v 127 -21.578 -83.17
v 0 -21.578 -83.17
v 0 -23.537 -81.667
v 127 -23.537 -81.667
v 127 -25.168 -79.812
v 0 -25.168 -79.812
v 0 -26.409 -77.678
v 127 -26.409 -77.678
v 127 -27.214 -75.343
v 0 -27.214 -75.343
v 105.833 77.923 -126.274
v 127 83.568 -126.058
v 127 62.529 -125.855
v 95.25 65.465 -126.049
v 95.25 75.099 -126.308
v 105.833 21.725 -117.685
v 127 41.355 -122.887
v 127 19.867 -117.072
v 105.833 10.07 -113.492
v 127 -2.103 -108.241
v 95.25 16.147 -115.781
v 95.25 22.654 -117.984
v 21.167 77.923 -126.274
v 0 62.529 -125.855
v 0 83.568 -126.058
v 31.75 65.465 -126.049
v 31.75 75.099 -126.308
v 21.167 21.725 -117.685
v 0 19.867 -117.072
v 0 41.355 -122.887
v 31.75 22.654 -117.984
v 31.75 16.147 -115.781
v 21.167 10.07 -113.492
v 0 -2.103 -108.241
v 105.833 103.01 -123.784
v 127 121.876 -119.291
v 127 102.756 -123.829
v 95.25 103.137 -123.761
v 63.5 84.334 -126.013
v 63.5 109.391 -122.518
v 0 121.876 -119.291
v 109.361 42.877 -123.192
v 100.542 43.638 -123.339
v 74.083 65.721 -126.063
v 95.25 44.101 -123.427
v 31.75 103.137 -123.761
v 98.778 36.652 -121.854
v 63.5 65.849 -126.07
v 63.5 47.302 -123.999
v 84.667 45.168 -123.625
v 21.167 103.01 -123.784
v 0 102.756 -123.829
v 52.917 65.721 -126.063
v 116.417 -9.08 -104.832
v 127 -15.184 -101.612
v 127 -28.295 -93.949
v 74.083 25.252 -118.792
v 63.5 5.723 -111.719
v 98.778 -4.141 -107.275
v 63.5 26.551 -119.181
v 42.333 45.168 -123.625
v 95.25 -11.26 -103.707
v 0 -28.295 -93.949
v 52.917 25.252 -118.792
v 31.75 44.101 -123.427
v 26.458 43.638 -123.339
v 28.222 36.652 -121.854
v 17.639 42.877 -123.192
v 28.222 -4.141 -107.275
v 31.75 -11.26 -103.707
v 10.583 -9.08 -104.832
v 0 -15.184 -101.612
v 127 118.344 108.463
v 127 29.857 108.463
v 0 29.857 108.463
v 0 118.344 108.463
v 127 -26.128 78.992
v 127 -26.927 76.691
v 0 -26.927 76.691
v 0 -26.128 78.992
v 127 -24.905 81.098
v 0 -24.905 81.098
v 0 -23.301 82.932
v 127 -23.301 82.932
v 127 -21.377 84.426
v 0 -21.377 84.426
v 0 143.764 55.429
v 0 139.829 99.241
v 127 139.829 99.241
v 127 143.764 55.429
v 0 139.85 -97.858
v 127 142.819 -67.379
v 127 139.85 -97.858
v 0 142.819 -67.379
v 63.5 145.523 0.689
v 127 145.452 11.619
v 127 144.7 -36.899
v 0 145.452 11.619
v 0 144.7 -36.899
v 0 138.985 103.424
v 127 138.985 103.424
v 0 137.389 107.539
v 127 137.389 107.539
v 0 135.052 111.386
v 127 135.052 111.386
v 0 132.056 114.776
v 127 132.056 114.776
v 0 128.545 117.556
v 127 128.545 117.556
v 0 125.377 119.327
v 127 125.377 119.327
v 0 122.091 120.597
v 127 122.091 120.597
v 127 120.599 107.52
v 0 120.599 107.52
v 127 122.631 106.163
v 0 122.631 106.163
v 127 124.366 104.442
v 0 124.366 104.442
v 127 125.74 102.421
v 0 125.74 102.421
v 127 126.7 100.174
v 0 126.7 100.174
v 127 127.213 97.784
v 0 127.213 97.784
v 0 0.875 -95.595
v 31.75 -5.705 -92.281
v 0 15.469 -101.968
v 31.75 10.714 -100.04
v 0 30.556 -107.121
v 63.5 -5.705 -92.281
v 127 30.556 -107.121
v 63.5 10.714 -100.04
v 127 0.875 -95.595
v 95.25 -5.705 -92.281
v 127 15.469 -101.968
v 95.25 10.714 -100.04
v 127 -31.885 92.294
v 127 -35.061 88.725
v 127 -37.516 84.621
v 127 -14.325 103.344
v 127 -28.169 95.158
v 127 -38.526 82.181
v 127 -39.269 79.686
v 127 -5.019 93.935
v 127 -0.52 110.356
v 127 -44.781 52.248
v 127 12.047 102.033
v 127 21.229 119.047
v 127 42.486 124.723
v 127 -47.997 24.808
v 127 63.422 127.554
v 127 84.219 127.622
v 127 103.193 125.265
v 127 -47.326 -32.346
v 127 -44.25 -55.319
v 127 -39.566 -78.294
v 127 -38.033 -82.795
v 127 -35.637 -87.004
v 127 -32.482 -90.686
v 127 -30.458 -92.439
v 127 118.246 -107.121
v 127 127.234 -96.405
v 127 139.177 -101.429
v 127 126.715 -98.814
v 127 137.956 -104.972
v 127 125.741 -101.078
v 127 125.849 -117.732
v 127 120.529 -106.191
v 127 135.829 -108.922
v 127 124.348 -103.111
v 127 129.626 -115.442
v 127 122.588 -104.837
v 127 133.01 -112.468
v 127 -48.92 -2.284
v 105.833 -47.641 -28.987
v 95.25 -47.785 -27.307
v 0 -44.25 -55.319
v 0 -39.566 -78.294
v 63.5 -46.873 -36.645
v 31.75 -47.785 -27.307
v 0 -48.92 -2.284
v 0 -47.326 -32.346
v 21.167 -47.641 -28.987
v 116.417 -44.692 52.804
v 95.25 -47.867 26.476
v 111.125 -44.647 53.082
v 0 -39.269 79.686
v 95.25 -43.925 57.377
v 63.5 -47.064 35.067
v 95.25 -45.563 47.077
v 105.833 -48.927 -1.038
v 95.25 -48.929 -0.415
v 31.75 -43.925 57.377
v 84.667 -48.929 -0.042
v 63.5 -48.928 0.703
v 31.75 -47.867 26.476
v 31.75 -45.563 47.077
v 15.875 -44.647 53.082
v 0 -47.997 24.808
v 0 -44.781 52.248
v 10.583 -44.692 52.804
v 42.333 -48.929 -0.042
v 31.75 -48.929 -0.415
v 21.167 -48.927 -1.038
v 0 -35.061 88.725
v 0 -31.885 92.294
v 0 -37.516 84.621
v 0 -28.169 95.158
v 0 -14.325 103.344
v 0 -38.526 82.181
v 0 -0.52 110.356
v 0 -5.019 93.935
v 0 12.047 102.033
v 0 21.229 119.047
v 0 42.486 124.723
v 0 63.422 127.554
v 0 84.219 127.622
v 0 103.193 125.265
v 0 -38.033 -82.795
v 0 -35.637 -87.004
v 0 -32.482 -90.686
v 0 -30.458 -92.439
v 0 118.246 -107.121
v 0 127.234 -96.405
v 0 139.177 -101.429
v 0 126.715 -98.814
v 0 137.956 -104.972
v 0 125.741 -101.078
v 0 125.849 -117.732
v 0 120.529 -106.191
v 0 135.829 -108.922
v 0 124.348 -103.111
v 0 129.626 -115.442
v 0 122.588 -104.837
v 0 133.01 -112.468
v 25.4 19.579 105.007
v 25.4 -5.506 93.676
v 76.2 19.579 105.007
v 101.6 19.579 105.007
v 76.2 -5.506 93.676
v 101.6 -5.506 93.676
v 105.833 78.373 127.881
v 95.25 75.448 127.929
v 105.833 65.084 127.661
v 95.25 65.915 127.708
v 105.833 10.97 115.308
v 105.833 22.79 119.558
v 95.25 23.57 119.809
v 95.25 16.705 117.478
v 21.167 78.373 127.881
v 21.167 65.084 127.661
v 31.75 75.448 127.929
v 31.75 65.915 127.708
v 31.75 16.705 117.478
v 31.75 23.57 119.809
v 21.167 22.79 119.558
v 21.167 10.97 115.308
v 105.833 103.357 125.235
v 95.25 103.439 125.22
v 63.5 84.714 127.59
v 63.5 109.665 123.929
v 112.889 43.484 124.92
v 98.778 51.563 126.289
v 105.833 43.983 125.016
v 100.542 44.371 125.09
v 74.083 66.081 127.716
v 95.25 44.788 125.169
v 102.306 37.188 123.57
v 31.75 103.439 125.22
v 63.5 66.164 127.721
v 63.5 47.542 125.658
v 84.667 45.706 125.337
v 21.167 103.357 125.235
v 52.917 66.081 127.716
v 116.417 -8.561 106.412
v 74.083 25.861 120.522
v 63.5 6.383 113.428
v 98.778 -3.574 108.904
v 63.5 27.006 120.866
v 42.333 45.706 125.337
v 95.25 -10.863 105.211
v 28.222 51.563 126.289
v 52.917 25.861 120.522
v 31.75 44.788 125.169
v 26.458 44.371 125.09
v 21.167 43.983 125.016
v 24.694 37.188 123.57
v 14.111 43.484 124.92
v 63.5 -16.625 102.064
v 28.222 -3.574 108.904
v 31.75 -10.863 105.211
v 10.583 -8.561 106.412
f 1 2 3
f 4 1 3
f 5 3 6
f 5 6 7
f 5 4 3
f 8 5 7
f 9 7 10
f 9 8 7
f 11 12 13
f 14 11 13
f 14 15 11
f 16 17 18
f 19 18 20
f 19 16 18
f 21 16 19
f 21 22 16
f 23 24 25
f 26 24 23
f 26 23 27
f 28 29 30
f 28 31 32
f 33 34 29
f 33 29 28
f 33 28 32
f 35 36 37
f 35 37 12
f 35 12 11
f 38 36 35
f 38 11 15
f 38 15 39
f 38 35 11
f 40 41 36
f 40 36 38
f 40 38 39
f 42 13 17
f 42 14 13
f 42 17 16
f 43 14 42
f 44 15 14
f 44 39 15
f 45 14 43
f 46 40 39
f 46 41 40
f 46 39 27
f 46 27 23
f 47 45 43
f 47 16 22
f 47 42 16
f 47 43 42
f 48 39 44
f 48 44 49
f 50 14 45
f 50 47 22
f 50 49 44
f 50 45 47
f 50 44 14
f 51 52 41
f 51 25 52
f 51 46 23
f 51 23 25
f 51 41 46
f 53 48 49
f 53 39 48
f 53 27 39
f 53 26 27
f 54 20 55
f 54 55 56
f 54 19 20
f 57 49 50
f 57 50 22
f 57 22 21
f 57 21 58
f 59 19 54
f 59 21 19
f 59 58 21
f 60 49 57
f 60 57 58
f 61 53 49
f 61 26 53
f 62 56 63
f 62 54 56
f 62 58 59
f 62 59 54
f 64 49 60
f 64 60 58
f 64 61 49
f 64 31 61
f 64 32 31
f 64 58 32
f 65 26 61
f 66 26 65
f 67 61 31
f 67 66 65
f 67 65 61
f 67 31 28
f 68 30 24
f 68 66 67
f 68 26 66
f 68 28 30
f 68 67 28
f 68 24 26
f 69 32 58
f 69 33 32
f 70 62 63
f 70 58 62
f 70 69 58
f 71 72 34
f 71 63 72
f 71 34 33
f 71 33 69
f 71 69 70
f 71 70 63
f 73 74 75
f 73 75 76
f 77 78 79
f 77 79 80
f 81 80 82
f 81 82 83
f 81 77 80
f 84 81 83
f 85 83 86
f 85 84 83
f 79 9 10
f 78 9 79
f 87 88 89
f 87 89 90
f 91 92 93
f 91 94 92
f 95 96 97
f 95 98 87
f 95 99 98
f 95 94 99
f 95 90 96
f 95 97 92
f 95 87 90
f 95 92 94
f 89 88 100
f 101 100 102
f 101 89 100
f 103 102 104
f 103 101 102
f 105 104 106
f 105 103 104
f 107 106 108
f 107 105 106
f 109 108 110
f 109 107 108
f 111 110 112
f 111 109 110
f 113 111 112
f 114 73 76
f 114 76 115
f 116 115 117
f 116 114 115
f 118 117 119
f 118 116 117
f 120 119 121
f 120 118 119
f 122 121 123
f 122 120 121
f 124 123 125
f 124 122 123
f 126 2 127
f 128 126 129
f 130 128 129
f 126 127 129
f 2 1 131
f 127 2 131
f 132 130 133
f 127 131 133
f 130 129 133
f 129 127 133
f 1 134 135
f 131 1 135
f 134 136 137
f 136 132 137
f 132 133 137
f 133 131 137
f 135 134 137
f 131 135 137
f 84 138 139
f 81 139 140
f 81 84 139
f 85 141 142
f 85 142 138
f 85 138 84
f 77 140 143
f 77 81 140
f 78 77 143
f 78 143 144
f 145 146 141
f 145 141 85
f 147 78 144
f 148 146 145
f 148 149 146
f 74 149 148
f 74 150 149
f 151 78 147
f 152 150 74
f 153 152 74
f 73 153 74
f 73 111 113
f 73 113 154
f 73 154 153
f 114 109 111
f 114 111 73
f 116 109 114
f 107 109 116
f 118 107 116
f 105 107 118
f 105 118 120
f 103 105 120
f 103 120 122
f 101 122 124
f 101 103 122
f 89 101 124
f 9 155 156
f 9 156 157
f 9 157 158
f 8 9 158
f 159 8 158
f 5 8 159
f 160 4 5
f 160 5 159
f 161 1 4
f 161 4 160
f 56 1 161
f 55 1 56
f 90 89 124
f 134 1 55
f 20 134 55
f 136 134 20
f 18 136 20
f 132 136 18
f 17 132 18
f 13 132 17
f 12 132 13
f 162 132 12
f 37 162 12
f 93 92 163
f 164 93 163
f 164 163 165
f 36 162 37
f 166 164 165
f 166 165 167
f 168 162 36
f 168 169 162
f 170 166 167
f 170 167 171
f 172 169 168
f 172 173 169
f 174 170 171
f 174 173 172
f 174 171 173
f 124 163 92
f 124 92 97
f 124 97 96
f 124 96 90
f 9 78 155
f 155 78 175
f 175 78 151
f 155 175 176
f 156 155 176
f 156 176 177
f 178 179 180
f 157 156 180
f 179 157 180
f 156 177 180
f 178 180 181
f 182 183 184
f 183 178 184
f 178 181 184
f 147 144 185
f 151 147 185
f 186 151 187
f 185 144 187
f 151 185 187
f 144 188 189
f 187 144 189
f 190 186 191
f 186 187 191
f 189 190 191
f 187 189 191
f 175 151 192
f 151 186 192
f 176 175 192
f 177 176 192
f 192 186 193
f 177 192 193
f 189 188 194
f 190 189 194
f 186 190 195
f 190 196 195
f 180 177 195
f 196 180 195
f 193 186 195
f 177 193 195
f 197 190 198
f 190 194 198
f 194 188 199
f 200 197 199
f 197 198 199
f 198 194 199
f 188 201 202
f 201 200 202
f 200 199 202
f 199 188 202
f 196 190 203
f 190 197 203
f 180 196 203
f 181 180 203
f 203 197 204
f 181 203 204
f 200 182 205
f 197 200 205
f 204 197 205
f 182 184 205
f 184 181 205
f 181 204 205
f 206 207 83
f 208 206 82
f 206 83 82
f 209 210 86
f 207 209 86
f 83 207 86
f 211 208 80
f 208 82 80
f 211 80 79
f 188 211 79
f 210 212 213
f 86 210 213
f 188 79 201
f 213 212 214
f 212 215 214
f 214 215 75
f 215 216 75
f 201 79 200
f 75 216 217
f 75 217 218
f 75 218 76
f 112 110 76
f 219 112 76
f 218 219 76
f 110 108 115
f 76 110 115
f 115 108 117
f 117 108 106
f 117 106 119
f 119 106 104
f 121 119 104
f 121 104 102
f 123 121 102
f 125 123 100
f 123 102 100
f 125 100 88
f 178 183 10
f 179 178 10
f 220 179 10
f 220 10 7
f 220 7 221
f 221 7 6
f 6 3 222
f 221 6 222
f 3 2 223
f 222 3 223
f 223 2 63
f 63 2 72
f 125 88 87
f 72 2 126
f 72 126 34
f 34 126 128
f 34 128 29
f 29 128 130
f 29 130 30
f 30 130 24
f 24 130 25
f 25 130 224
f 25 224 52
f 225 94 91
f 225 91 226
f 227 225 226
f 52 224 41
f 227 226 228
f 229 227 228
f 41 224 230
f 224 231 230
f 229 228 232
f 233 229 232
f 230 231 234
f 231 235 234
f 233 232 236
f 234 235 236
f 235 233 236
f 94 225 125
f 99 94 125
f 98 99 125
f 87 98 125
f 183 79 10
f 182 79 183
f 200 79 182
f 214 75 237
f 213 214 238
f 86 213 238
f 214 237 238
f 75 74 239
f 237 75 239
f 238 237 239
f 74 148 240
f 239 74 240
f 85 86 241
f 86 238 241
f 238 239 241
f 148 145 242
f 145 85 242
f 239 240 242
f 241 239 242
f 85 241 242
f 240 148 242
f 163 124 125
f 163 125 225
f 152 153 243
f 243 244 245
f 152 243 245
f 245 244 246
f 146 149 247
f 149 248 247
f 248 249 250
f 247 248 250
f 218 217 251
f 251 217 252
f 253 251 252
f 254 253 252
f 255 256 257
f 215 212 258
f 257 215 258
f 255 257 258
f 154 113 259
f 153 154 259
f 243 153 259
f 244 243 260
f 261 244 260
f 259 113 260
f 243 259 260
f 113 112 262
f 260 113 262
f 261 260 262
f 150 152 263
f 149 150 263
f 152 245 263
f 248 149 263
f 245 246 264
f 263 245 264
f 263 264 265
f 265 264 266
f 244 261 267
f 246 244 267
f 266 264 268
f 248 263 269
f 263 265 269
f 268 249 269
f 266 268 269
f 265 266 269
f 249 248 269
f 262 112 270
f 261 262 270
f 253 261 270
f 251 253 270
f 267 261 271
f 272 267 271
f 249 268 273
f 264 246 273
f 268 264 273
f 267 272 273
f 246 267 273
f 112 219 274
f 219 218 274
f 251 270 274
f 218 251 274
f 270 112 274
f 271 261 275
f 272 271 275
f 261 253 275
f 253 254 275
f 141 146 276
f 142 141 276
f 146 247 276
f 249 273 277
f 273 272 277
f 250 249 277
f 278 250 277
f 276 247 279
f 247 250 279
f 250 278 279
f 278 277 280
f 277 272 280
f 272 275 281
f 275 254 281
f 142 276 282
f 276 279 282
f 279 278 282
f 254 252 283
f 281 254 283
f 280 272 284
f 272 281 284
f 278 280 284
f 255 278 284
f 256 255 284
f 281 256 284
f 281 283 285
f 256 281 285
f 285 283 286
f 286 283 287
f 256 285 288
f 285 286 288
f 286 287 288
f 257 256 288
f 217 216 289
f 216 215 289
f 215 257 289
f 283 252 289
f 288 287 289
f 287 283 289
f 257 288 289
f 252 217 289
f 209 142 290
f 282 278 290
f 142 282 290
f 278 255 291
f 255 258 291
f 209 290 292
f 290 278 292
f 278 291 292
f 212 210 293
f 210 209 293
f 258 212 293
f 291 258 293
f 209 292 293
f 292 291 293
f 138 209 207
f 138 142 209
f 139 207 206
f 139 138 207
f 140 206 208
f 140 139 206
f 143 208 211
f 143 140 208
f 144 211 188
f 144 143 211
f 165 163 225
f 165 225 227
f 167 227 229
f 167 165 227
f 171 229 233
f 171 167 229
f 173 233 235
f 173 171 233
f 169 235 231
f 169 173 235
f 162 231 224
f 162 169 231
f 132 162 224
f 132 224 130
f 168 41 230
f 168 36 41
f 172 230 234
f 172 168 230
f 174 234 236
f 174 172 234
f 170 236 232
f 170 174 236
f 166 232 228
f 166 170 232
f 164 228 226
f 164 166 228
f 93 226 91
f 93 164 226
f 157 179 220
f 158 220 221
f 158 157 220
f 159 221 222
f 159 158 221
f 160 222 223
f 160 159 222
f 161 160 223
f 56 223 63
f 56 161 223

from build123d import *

# Parameters (mm, degrees)
BOSS_EXTRUDE8_DEPTH = 127
FILLET4_R           = 25.4
FILLET5_R           = 25.4
FILLET6_R           = 25.4
FILLET7_R           = 25.4
CUT_EXTRUDE3_DEPTH  = 127


with BuildPart() as part:
    # Sketch8 → Boss-Extrude8 (new body)
    with BuildSketch(Plane(origin=(0, 0, 0), x_dir=(0, 0, -1), z_dir=(1, 0, 0))):
        with BuildLine():
            add(Edge.make_bspline(
                [(-89.517321988, -36.735442624), (-0.634104952, -60.975176902), (88.282437318, -37.028001665)],
                knots=[0, 0, 0, 1, 1, 1], degree=2))
            add(Edge.make_bspline(
                [(113.698608464, 137.87777005), (148.206005145, 51.814722278), (88.282437318, -37.028001665)],
                knots=[0, 0, 0, 1, 1, 1], degree=2))
            add(Edge.make_bspline(
                [(-114.901391536, 137.87777005), (-0.596034429, 153.168104446), (113.698608464, 137.87777005)],
                knots=[0, 0, 0, 1, 1, 1], degree=2))
            add(Edge.make_bspline(
                [(-114.901391536, 137.87777005), (-150.307927624, 52.141383045), (-89.517321988, -36.735442624)],
                knots=[0, 0, 0, 1, 1, 1], degree=2))
        make_face()
    extrude(amount=BOSS_EXTRUDE8_DEPTH)

    # Fillet4
    fillet4_edges = [part.edges().sort_by_distance(p)[0] for p in [
        (63.5, 137.87777005, 114.901391536),
    ]]
    fillet(fillet4_edges, radius=FILLET4_R)

    # Fillet5
    fillet5_edges = [part.edges().sort_by_distance(p)[0] for p in [
        (63.5, -36.735442624, 89.517321988),
    ]]
    fillet(fillet5_edges, radius=FILLET5_R)

    # Fillet6
    fillet6_edges = [part.edges().sort_by_distance(p)[0] for p in [
        (63.5, -37.028001665, -88.282437318),
    ]]
    fillet(fillet6_edges, radius=FILLET6_R)

    # Fillet7
    fillet7_edges = [part.edges().sort_by_distance(p)[0] for p in [
        (63.5, 137.87777005, -113.698608464),
    ]]
    fillet(fillet7_edges, radius=FILLET7_R)

    # Sketch11 → Cut-Extrude3 (cut)
    with BuildSketch(Plane(origin=(127, 0, 0), x_dir=(0, 0, -1), z_dir=(1, 0, 0))):
        with BuildLine():
            Line((-97.784453692, 127.212925067), (96.404571612, 127.233510211))
            ThreePointArc((96.404571612, 127.233510211), (103.111414071, 124.347995488), (107.121047874, 118.246293452))
            Line((107.121047874, 118.246293452), (107.121047874, 30.555919475))
            add(Edge.make_bspline(
                [(83.170467652, -21.57810628), (86.415391697, -16.370968411), (89.460079781, -11.083046595), (95.101033744, -0.326289829), (97.697391853, 5.142507912), (102.383358499, 16.284548341), (104.473090716, 21.95774113), (106.563539535, 28.680710784), (106.846143616, 29.616761907), (107.121047874, 30.555919475)],
                knots=[0, 0, 0, 0, 0.125, 0.125, 0.25, 0.25, 0.375, 0.375, 0.395143119, 0.395143119, 0.395143119, 0.395143119], degree=3))
            ThreePointArc((83.170467652, -21.57810628), (79.812495261, -25.167952265), (75.342856961, -27.213754366))
            Line((75.342856961, -27.213754366), (-76.690566802, -26.92748329))
            ThreePointArc((-76.690566802, -26.92748329), (-81.098266675, -24.904774618), (-84.426415504, -21.377368501))
            add(Edge.make_bspline(
                [(-108.462610917, 29.857145517), (-108.303396788, 29.330392074), (-108.141581554, 28.804173566), (-107.065329258, 25.36262207), (-106.073914954, 22.462725348), (-103.939463914, 16.695703597), (-102.803256231, 13.846836717), (-99.203580144, 5.396186106), (-96.549578269, -0.10990853), (-90.803206271, -10.901941939), (-87.710677179, -16.187800874), (-84.426415504, -21.377368501)],
                knots=[0.613732154, 0.613732154, 0.613732154, 0.613732154, 0.625, 0.625, 0.6875, 0.6875, 0.75, 0.75, 0.875, 0.875, 1, 1, 1, 1], degree=3))
            Line((-108.462610917, 29.857145517), (-108.462610917, 118.343948745))
            ThreePointArc((-108.462610917, 118.343948745), (-104.442431913, 124.366378611), (-97.784453692, 127.212925067))
        make_face()
    extrude(amount=-CUT_EXTRUDE3_DEPTH, mode=Mode.SUBTRACT)


solid = part.part
